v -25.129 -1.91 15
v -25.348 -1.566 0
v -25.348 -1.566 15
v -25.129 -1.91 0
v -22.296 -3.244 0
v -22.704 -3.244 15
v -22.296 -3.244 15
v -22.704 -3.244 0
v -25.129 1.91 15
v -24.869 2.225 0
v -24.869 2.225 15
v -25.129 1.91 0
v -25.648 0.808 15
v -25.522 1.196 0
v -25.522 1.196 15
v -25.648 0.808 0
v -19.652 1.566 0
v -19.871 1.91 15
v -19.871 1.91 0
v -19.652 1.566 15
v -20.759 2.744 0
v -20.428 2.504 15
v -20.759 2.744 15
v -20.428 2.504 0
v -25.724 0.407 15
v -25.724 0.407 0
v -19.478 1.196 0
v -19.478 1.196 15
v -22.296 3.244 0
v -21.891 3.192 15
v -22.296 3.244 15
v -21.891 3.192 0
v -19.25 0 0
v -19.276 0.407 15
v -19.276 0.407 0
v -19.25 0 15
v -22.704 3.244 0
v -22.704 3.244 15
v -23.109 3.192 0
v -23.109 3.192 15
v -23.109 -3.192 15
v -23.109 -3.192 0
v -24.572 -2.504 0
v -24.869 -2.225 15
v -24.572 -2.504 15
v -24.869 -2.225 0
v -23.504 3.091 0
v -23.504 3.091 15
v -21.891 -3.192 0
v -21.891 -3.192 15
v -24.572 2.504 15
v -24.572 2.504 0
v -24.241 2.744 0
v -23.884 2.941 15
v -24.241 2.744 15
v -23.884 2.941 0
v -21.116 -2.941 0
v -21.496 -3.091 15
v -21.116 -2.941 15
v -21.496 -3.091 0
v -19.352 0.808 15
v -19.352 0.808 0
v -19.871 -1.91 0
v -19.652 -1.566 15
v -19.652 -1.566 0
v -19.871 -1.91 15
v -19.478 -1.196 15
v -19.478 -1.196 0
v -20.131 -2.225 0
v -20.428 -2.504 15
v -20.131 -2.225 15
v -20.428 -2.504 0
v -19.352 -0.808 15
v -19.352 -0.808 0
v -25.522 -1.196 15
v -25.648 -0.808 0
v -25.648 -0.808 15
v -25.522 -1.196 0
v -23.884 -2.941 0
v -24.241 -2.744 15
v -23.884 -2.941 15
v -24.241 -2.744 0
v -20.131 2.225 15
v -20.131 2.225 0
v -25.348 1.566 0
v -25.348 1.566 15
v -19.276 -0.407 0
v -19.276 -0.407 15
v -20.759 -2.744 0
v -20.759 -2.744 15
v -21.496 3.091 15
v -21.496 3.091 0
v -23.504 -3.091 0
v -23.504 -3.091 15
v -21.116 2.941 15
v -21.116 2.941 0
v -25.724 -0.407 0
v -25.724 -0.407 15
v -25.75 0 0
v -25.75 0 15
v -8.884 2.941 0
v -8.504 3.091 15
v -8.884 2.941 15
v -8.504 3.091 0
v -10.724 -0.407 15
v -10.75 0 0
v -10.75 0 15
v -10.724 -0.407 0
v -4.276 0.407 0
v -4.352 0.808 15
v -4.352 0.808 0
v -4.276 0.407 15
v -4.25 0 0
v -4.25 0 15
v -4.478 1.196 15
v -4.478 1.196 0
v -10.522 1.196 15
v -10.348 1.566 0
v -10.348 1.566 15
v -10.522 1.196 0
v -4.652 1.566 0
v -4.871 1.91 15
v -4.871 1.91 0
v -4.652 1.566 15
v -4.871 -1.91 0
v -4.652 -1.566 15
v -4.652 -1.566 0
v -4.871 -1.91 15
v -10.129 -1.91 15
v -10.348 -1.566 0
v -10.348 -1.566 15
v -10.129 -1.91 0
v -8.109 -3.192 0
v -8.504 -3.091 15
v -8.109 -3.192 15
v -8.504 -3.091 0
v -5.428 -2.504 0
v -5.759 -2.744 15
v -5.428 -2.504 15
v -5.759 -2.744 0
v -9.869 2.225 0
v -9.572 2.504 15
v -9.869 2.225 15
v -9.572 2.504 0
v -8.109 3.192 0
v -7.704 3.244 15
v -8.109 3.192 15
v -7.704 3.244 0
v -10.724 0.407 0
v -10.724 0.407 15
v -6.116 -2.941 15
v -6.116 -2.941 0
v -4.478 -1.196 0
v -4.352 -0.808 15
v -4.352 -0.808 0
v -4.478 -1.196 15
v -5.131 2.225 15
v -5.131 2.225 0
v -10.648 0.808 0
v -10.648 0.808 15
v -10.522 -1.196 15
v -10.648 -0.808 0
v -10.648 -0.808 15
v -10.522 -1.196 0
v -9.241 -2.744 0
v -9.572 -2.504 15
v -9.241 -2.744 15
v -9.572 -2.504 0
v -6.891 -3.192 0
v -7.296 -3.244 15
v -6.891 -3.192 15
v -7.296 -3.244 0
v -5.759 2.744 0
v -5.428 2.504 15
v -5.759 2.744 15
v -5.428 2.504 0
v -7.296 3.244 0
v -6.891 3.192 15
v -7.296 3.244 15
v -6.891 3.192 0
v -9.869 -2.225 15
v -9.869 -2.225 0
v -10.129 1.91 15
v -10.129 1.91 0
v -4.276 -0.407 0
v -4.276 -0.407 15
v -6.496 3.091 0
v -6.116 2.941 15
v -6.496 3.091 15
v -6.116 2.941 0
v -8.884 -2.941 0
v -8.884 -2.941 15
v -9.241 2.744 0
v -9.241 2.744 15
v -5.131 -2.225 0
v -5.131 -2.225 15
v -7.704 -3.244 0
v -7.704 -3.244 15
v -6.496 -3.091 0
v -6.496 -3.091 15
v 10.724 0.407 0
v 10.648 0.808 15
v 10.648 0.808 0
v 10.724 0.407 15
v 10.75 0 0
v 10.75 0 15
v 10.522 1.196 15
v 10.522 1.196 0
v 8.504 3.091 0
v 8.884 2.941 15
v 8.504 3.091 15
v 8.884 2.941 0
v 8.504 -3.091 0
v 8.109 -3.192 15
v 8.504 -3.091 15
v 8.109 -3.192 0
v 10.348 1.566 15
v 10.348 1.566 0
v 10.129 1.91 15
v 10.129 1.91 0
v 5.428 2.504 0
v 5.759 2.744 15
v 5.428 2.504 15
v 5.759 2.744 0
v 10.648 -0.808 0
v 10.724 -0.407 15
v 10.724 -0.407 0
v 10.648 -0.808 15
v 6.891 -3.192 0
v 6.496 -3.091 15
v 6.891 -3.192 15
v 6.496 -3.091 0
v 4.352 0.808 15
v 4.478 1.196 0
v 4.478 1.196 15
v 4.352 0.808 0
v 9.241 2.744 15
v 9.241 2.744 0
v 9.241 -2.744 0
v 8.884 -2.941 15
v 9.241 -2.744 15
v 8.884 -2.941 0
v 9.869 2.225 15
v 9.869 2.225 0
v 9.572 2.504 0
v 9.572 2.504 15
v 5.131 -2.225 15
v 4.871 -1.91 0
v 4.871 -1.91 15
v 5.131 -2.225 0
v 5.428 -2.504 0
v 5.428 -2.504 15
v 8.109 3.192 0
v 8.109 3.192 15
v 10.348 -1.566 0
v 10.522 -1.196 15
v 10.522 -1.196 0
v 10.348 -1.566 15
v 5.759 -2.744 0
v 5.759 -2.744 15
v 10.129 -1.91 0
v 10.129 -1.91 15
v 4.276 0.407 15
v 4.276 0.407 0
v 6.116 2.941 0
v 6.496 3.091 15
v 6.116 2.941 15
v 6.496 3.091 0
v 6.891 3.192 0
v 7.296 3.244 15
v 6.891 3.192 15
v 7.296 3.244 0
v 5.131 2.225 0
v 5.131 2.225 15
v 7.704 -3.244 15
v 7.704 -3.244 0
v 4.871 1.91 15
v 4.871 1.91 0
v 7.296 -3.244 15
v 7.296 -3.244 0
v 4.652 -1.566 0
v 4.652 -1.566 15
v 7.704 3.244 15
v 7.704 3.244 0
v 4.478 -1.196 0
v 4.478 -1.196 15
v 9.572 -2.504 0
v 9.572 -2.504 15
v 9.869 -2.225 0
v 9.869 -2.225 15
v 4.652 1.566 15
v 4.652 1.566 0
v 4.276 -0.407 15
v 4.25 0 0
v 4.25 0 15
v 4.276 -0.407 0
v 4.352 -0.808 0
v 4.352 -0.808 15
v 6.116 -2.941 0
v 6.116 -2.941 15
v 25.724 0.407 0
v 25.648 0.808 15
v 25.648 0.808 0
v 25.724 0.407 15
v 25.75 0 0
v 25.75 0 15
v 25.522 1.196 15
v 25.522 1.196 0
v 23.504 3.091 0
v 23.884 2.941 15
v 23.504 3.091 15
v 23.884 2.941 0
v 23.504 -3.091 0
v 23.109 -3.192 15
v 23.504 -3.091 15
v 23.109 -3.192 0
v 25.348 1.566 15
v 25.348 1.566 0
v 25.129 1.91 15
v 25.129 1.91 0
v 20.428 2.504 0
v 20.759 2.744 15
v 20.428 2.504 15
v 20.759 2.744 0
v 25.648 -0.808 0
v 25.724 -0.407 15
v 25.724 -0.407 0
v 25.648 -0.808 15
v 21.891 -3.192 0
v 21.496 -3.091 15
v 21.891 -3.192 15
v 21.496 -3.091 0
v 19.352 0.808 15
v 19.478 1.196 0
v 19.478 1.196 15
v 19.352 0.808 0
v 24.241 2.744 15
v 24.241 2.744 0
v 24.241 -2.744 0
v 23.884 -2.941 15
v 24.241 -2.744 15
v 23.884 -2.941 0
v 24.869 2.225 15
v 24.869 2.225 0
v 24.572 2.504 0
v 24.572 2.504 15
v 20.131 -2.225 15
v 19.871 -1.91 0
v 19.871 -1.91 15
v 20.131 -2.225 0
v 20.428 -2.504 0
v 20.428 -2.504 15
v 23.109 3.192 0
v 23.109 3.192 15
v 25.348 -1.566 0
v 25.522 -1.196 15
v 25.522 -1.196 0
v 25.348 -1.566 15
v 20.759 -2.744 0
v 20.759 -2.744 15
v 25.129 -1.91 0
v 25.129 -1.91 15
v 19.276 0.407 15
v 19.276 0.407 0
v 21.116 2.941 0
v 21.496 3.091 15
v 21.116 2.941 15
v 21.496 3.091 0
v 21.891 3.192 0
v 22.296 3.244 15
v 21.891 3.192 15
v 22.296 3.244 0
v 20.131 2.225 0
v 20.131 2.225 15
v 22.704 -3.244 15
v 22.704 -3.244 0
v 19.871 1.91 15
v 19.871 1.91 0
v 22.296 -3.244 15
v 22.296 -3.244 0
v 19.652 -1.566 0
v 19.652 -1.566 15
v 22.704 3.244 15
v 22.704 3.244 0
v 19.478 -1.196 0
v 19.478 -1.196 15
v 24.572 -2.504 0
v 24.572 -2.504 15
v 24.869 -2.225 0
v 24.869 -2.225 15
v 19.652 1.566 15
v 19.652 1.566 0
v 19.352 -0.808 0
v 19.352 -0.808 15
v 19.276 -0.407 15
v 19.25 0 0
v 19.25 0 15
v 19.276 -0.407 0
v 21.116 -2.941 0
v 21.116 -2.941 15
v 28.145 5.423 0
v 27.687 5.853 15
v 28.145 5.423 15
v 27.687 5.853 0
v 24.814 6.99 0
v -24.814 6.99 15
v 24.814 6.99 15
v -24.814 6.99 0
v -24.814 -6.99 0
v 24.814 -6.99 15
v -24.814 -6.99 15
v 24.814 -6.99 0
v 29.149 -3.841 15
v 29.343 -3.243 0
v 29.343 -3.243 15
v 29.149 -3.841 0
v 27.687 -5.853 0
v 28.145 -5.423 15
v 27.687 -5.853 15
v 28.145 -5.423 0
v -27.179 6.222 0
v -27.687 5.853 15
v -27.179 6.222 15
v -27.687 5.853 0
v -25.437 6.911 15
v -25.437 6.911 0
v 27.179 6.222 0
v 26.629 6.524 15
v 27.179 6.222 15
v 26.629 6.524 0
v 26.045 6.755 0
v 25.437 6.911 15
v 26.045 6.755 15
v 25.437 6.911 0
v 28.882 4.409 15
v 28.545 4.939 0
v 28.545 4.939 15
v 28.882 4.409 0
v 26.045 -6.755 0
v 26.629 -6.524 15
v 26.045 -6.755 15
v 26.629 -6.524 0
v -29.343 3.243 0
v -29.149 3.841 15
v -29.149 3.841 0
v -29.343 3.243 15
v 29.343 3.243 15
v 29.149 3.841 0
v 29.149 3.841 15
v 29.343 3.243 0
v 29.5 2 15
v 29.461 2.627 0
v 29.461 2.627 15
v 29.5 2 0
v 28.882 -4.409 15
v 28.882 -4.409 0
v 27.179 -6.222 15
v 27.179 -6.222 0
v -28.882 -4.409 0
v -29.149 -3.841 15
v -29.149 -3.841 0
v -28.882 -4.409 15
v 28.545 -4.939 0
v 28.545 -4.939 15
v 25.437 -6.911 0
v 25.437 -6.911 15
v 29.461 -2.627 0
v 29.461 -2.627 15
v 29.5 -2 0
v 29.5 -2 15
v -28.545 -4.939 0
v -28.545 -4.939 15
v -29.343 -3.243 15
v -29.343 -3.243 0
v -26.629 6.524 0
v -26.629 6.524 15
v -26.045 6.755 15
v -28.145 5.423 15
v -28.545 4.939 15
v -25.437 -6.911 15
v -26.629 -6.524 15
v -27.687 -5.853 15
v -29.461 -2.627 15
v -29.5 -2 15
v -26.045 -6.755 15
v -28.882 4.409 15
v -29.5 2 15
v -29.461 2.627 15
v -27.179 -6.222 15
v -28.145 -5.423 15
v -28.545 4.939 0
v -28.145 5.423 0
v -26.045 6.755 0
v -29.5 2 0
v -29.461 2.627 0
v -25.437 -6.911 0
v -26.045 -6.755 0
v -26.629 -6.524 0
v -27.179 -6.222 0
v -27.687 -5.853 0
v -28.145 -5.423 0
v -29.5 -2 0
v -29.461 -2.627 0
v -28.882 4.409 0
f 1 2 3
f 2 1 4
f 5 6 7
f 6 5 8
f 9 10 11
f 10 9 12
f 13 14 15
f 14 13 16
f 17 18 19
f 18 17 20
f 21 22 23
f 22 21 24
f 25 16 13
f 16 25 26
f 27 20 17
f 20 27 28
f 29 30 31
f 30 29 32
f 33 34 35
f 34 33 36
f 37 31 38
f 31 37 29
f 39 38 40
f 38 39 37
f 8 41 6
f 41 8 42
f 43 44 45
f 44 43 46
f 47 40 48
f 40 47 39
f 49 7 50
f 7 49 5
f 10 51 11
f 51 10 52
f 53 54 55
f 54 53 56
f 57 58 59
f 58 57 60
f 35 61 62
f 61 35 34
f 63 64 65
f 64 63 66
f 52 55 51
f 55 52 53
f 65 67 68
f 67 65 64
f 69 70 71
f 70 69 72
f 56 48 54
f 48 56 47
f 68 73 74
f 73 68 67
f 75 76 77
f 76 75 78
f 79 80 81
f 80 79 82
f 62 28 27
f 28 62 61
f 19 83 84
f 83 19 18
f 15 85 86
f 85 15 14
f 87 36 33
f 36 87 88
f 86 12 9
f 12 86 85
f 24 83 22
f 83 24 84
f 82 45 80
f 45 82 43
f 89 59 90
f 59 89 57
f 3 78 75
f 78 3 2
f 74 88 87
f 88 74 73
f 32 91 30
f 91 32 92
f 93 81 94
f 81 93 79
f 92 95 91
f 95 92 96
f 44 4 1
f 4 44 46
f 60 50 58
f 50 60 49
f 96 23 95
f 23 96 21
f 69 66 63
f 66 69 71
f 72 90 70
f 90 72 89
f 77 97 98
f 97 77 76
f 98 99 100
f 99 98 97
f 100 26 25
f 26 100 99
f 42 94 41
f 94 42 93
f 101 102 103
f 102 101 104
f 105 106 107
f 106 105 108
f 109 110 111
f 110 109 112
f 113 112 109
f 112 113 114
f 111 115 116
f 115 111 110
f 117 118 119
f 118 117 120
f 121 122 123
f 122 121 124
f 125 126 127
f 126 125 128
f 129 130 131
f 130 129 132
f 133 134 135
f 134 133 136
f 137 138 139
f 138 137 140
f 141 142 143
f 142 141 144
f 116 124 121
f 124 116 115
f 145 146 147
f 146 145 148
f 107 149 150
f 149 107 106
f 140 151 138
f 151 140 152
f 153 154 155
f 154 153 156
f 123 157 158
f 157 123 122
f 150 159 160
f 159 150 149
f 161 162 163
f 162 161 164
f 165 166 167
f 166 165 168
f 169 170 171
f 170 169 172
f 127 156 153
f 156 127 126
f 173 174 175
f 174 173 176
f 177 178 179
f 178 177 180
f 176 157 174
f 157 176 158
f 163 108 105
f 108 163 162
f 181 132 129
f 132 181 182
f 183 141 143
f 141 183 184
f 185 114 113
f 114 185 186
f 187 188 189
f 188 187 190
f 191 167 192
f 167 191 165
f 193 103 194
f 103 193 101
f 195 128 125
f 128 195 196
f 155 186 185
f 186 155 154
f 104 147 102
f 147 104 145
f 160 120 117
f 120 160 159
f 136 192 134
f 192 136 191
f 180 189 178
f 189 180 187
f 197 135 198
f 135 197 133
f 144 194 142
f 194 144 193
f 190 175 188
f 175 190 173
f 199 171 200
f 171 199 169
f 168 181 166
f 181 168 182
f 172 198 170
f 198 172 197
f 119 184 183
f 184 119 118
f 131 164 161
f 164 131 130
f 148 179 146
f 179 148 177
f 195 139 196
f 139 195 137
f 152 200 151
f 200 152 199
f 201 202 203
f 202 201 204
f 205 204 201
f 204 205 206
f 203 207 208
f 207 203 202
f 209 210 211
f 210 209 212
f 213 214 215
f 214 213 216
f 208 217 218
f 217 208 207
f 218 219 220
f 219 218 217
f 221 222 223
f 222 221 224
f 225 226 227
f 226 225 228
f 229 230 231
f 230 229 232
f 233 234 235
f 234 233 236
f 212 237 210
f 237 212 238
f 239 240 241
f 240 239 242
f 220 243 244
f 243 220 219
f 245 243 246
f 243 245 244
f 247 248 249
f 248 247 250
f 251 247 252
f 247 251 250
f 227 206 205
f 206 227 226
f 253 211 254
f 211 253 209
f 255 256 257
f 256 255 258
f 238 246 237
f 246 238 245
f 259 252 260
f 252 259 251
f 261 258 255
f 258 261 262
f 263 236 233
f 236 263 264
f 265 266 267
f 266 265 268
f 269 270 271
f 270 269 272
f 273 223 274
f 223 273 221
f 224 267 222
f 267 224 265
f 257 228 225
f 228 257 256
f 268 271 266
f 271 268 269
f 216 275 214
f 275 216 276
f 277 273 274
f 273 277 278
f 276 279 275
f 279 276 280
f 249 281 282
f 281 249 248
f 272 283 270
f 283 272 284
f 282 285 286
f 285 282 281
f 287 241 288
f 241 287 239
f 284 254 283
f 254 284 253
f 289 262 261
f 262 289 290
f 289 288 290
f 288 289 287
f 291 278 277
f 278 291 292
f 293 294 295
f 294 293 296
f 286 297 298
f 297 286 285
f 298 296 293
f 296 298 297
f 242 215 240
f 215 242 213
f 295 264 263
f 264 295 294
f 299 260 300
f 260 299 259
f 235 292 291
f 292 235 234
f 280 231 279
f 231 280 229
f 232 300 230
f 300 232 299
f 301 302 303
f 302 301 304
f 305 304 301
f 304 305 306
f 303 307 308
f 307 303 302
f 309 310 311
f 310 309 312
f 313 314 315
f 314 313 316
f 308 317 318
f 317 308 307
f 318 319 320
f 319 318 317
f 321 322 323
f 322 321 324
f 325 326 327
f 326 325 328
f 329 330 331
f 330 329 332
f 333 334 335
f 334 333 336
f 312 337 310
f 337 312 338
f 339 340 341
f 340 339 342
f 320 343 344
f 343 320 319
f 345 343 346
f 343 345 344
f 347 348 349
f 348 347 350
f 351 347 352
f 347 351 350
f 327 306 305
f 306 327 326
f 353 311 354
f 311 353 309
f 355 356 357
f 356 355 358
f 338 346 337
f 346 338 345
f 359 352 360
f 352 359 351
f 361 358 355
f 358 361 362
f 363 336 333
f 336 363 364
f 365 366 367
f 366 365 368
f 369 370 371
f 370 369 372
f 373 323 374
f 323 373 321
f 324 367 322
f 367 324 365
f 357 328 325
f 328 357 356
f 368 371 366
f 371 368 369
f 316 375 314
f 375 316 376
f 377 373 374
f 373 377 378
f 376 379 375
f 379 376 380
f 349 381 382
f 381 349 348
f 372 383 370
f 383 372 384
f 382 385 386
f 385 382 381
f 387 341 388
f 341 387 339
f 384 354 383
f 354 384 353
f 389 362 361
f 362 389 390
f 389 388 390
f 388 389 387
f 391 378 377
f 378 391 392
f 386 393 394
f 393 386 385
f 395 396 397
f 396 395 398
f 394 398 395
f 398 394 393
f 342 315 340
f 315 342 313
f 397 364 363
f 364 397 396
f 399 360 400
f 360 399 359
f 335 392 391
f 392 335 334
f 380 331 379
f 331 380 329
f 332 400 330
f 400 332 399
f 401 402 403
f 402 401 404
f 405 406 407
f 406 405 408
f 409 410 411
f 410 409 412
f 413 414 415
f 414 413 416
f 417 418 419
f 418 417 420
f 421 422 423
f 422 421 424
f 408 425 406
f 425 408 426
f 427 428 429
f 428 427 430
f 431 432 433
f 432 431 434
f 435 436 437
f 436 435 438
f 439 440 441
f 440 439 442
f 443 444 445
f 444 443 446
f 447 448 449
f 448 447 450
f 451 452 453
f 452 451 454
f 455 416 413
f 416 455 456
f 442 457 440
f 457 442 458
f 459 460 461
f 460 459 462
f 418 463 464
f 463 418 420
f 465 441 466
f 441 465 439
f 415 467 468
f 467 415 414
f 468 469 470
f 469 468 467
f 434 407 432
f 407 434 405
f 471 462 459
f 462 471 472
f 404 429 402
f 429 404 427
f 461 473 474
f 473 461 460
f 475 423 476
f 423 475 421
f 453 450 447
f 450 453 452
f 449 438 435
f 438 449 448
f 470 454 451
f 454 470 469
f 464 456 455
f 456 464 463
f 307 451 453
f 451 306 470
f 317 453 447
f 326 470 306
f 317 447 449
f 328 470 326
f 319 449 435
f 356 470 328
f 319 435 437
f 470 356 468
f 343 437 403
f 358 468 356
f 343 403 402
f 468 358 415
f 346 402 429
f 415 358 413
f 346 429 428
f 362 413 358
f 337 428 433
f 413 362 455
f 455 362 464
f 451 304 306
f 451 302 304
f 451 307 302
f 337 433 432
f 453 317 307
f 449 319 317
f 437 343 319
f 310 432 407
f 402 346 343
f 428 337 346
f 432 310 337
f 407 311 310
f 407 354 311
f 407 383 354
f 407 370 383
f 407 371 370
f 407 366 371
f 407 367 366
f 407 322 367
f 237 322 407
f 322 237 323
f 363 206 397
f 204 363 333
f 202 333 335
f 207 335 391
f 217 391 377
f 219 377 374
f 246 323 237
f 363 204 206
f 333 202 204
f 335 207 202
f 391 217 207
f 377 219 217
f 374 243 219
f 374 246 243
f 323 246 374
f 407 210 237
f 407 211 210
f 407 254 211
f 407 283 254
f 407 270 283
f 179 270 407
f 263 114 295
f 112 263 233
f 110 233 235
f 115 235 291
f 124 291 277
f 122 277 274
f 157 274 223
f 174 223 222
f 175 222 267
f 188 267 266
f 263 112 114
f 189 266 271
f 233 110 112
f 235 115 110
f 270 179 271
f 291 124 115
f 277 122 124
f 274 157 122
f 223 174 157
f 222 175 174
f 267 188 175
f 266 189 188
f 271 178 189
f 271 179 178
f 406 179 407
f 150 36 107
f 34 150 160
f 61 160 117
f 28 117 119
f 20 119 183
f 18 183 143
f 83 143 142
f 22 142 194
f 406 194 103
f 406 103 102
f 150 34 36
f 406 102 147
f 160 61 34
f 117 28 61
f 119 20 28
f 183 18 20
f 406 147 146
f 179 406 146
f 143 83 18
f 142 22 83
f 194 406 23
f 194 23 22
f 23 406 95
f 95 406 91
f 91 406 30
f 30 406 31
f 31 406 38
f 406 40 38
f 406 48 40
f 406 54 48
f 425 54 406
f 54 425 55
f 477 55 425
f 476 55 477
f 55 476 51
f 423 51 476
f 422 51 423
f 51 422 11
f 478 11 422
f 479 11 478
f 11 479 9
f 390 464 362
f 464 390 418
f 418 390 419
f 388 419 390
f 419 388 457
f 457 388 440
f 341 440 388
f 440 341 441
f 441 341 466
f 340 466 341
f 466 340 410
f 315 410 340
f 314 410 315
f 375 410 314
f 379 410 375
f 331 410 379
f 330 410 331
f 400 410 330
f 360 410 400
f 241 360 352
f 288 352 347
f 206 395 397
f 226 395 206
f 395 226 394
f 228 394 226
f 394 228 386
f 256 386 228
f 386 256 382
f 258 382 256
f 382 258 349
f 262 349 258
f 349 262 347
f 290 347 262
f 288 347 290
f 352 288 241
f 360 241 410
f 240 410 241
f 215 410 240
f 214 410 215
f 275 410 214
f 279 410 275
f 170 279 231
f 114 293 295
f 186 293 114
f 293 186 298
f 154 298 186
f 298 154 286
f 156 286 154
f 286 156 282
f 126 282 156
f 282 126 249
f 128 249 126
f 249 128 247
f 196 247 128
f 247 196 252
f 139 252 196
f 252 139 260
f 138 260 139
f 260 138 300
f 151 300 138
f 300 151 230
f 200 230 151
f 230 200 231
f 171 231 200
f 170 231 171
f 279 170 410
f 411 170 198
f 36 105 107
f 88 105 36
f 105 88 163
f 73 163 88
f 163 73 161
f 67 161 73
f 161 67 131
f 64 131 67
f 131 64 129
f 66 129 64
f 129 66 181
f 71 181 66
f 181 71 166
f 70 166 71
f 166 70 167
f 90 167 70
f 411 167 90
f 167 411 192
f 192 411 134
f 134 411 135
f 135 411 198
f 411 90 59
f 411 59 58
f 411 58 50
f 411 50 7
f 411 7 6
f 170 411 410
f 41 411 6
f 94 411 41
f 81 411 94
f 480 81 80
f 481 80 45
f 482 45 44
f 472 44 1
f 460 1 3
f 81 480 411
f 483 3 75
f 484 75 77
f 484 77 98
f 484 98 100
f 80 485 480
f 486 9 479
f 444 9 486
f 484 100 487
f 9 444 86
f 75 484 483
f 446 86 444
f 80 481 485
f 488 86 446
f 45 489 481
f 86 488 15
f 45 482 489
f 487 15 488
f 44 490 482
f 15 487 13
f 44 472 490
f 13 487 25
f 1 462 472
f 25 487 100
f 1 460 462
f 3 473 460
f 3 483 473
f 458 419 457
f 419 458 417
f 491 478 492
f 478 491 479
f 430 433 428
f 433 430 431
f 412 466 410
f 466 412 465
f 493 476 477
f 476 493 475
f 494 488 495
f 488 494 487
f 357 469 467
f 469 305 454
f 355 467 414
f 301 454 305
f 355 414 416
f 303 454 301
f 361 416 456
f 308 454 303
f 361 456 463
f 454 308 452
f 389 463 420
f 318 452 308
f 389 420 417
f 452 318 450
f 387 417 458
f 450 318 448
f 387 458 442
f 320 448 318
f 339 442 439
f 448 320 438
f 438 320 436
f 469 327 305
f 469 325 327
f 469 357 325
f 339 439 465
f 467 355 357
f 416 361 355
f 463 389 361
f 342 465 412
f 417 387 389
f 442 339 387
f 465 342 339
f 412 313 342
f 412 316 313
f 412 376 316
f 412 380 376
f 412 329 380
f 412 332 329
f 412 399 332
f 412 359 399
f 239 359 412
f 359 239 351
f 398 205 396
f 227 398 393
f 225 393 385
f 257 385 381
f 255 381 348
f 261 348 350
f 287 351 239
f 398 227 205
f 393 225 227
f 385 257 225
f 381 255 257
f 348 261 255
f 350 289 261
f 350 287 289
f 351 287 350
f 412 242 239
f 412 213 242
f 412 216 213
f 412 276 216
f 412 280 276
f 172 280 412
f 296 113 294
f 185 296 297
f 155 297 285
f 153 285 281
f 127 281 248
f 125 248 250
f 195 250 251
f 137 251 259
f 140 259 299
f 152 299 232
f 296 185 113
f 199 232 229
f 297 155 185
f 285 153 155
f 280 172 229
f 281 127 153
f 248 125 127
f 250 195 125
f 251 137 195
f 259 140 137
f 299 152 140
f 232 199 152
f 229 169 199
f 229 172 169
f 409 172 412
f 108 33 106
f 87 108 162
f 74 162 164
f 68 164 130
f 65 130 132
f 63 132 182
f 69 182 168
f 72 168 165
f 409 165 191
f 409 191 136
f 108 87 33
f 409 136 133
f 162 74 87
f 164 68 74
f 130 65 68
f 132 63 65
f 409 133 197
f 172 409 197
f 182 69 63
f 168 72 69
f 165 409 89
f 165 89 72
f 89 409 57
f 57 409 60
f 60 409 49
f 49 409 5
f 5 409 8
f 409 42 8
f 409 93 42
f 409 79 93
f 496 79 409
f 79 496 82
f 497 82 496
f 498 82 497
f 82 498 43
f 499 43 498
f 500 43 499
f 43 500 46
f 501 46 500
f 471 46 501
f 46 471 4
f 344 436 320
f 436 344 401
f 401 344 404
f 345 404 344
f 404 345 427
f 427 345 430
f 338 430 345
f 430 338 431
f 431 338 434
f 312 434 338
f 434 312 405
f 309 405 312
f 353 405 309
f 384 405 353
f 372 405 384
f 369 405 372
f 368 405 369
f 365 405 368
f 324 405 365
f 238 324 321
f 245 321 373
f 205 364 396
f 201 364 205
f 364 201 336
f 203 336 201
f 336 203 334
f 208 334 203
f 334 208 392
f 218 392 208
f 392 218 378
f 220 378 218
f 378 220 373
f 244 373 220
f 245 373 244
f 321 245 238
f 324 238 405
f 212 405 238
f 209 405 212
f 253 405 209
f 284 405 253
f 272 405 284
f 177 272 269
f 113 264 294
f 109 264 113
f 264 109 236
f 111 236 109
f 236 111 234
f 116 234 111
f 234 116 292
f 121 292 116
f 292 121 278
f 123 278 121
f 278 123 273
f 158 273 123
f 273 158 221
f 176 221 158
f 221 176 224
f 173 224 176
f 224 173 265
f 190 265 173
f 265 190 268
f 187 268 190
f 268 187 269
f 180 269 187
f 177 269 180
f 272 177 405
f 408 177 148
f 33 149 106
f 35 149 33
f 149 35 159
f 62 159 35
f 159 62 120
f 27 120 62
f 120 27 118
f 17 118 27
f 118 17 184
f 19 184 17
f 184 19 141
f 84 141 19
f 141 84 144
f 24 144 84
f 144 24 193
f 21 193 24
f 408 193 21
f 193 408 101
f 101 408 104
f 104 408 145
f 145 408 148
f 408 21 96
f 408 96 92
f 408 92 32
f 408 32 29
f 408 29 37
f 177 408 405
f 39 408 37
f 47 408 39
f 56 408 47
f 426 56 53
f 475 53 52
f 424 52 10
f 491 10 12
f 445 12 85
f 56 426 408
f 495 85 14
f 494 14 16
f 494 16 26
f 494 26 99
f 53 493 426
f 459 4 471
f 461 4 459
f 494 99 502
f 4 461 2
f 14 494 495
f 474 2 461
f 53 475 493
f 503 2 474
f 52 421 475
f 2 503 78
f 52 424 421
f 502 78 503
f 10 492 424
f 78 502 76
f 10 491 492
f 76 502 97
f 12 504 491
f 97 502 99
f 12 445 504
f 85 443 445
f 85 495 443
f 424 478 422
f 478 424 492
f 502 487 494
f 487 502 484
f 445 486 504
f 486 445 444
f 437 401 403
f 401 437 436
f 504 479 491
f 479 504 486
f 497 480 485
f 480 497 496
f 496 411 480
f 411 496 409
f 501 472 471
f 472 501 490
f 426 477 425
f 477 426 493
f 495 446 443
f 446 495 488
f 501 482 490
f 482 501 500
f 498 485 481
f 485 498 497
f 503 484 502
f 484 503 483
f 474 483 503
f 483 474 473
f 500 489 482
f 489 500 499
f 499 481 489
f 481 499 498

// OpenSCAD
$fn = 50;


difference() {
	union() {
		hull() {
			translate(v = [-24.5000000000, 2.0000000000, 0]) {
				cylinder(h = 15, r = 5);
			}
			translate(v = [24.5000000000, 2.0000000000, 0]) {
				cylinder(h = 15, r = 5);
			}
			translate(v = [-24.5000000000, -2.0000000000, 0]) {
				cylinder(h = 15, r = 5);
			}
			translate(v = [24.5000000000, -2.0000000000, 0]) {
				cylinder(h = 15, r = 5);
			}
		}
	}
	union() {
		translate(v = [-22.5000000000, 0.0000000000, 0]) {
			translate(v = [0, 0, -100]) {
				cylinder(h = 200, r = 3.2500000000);
			}
		}
		translate(v = [-7.5000000000, 0.0000000000, 0]) {
			translate(v = [0, 0, -100]) {
				cylinder(h = 200, r = 3.2500000000);
			}
		}
		translate(v = [7.5000000000, 0.0000000000, 0]) {
			translate(v = [0, 0, -100]) {
				cylinder(h = 200, r = 3.2500000000);
			}
		}
		translate(v = [22.5000000000, 0.0000000000, 0]) {
			translate(v = [0, 0, -100]) {
				cylinder(h = 200, r = 3.2500000000);
			}
		}
	}
}
